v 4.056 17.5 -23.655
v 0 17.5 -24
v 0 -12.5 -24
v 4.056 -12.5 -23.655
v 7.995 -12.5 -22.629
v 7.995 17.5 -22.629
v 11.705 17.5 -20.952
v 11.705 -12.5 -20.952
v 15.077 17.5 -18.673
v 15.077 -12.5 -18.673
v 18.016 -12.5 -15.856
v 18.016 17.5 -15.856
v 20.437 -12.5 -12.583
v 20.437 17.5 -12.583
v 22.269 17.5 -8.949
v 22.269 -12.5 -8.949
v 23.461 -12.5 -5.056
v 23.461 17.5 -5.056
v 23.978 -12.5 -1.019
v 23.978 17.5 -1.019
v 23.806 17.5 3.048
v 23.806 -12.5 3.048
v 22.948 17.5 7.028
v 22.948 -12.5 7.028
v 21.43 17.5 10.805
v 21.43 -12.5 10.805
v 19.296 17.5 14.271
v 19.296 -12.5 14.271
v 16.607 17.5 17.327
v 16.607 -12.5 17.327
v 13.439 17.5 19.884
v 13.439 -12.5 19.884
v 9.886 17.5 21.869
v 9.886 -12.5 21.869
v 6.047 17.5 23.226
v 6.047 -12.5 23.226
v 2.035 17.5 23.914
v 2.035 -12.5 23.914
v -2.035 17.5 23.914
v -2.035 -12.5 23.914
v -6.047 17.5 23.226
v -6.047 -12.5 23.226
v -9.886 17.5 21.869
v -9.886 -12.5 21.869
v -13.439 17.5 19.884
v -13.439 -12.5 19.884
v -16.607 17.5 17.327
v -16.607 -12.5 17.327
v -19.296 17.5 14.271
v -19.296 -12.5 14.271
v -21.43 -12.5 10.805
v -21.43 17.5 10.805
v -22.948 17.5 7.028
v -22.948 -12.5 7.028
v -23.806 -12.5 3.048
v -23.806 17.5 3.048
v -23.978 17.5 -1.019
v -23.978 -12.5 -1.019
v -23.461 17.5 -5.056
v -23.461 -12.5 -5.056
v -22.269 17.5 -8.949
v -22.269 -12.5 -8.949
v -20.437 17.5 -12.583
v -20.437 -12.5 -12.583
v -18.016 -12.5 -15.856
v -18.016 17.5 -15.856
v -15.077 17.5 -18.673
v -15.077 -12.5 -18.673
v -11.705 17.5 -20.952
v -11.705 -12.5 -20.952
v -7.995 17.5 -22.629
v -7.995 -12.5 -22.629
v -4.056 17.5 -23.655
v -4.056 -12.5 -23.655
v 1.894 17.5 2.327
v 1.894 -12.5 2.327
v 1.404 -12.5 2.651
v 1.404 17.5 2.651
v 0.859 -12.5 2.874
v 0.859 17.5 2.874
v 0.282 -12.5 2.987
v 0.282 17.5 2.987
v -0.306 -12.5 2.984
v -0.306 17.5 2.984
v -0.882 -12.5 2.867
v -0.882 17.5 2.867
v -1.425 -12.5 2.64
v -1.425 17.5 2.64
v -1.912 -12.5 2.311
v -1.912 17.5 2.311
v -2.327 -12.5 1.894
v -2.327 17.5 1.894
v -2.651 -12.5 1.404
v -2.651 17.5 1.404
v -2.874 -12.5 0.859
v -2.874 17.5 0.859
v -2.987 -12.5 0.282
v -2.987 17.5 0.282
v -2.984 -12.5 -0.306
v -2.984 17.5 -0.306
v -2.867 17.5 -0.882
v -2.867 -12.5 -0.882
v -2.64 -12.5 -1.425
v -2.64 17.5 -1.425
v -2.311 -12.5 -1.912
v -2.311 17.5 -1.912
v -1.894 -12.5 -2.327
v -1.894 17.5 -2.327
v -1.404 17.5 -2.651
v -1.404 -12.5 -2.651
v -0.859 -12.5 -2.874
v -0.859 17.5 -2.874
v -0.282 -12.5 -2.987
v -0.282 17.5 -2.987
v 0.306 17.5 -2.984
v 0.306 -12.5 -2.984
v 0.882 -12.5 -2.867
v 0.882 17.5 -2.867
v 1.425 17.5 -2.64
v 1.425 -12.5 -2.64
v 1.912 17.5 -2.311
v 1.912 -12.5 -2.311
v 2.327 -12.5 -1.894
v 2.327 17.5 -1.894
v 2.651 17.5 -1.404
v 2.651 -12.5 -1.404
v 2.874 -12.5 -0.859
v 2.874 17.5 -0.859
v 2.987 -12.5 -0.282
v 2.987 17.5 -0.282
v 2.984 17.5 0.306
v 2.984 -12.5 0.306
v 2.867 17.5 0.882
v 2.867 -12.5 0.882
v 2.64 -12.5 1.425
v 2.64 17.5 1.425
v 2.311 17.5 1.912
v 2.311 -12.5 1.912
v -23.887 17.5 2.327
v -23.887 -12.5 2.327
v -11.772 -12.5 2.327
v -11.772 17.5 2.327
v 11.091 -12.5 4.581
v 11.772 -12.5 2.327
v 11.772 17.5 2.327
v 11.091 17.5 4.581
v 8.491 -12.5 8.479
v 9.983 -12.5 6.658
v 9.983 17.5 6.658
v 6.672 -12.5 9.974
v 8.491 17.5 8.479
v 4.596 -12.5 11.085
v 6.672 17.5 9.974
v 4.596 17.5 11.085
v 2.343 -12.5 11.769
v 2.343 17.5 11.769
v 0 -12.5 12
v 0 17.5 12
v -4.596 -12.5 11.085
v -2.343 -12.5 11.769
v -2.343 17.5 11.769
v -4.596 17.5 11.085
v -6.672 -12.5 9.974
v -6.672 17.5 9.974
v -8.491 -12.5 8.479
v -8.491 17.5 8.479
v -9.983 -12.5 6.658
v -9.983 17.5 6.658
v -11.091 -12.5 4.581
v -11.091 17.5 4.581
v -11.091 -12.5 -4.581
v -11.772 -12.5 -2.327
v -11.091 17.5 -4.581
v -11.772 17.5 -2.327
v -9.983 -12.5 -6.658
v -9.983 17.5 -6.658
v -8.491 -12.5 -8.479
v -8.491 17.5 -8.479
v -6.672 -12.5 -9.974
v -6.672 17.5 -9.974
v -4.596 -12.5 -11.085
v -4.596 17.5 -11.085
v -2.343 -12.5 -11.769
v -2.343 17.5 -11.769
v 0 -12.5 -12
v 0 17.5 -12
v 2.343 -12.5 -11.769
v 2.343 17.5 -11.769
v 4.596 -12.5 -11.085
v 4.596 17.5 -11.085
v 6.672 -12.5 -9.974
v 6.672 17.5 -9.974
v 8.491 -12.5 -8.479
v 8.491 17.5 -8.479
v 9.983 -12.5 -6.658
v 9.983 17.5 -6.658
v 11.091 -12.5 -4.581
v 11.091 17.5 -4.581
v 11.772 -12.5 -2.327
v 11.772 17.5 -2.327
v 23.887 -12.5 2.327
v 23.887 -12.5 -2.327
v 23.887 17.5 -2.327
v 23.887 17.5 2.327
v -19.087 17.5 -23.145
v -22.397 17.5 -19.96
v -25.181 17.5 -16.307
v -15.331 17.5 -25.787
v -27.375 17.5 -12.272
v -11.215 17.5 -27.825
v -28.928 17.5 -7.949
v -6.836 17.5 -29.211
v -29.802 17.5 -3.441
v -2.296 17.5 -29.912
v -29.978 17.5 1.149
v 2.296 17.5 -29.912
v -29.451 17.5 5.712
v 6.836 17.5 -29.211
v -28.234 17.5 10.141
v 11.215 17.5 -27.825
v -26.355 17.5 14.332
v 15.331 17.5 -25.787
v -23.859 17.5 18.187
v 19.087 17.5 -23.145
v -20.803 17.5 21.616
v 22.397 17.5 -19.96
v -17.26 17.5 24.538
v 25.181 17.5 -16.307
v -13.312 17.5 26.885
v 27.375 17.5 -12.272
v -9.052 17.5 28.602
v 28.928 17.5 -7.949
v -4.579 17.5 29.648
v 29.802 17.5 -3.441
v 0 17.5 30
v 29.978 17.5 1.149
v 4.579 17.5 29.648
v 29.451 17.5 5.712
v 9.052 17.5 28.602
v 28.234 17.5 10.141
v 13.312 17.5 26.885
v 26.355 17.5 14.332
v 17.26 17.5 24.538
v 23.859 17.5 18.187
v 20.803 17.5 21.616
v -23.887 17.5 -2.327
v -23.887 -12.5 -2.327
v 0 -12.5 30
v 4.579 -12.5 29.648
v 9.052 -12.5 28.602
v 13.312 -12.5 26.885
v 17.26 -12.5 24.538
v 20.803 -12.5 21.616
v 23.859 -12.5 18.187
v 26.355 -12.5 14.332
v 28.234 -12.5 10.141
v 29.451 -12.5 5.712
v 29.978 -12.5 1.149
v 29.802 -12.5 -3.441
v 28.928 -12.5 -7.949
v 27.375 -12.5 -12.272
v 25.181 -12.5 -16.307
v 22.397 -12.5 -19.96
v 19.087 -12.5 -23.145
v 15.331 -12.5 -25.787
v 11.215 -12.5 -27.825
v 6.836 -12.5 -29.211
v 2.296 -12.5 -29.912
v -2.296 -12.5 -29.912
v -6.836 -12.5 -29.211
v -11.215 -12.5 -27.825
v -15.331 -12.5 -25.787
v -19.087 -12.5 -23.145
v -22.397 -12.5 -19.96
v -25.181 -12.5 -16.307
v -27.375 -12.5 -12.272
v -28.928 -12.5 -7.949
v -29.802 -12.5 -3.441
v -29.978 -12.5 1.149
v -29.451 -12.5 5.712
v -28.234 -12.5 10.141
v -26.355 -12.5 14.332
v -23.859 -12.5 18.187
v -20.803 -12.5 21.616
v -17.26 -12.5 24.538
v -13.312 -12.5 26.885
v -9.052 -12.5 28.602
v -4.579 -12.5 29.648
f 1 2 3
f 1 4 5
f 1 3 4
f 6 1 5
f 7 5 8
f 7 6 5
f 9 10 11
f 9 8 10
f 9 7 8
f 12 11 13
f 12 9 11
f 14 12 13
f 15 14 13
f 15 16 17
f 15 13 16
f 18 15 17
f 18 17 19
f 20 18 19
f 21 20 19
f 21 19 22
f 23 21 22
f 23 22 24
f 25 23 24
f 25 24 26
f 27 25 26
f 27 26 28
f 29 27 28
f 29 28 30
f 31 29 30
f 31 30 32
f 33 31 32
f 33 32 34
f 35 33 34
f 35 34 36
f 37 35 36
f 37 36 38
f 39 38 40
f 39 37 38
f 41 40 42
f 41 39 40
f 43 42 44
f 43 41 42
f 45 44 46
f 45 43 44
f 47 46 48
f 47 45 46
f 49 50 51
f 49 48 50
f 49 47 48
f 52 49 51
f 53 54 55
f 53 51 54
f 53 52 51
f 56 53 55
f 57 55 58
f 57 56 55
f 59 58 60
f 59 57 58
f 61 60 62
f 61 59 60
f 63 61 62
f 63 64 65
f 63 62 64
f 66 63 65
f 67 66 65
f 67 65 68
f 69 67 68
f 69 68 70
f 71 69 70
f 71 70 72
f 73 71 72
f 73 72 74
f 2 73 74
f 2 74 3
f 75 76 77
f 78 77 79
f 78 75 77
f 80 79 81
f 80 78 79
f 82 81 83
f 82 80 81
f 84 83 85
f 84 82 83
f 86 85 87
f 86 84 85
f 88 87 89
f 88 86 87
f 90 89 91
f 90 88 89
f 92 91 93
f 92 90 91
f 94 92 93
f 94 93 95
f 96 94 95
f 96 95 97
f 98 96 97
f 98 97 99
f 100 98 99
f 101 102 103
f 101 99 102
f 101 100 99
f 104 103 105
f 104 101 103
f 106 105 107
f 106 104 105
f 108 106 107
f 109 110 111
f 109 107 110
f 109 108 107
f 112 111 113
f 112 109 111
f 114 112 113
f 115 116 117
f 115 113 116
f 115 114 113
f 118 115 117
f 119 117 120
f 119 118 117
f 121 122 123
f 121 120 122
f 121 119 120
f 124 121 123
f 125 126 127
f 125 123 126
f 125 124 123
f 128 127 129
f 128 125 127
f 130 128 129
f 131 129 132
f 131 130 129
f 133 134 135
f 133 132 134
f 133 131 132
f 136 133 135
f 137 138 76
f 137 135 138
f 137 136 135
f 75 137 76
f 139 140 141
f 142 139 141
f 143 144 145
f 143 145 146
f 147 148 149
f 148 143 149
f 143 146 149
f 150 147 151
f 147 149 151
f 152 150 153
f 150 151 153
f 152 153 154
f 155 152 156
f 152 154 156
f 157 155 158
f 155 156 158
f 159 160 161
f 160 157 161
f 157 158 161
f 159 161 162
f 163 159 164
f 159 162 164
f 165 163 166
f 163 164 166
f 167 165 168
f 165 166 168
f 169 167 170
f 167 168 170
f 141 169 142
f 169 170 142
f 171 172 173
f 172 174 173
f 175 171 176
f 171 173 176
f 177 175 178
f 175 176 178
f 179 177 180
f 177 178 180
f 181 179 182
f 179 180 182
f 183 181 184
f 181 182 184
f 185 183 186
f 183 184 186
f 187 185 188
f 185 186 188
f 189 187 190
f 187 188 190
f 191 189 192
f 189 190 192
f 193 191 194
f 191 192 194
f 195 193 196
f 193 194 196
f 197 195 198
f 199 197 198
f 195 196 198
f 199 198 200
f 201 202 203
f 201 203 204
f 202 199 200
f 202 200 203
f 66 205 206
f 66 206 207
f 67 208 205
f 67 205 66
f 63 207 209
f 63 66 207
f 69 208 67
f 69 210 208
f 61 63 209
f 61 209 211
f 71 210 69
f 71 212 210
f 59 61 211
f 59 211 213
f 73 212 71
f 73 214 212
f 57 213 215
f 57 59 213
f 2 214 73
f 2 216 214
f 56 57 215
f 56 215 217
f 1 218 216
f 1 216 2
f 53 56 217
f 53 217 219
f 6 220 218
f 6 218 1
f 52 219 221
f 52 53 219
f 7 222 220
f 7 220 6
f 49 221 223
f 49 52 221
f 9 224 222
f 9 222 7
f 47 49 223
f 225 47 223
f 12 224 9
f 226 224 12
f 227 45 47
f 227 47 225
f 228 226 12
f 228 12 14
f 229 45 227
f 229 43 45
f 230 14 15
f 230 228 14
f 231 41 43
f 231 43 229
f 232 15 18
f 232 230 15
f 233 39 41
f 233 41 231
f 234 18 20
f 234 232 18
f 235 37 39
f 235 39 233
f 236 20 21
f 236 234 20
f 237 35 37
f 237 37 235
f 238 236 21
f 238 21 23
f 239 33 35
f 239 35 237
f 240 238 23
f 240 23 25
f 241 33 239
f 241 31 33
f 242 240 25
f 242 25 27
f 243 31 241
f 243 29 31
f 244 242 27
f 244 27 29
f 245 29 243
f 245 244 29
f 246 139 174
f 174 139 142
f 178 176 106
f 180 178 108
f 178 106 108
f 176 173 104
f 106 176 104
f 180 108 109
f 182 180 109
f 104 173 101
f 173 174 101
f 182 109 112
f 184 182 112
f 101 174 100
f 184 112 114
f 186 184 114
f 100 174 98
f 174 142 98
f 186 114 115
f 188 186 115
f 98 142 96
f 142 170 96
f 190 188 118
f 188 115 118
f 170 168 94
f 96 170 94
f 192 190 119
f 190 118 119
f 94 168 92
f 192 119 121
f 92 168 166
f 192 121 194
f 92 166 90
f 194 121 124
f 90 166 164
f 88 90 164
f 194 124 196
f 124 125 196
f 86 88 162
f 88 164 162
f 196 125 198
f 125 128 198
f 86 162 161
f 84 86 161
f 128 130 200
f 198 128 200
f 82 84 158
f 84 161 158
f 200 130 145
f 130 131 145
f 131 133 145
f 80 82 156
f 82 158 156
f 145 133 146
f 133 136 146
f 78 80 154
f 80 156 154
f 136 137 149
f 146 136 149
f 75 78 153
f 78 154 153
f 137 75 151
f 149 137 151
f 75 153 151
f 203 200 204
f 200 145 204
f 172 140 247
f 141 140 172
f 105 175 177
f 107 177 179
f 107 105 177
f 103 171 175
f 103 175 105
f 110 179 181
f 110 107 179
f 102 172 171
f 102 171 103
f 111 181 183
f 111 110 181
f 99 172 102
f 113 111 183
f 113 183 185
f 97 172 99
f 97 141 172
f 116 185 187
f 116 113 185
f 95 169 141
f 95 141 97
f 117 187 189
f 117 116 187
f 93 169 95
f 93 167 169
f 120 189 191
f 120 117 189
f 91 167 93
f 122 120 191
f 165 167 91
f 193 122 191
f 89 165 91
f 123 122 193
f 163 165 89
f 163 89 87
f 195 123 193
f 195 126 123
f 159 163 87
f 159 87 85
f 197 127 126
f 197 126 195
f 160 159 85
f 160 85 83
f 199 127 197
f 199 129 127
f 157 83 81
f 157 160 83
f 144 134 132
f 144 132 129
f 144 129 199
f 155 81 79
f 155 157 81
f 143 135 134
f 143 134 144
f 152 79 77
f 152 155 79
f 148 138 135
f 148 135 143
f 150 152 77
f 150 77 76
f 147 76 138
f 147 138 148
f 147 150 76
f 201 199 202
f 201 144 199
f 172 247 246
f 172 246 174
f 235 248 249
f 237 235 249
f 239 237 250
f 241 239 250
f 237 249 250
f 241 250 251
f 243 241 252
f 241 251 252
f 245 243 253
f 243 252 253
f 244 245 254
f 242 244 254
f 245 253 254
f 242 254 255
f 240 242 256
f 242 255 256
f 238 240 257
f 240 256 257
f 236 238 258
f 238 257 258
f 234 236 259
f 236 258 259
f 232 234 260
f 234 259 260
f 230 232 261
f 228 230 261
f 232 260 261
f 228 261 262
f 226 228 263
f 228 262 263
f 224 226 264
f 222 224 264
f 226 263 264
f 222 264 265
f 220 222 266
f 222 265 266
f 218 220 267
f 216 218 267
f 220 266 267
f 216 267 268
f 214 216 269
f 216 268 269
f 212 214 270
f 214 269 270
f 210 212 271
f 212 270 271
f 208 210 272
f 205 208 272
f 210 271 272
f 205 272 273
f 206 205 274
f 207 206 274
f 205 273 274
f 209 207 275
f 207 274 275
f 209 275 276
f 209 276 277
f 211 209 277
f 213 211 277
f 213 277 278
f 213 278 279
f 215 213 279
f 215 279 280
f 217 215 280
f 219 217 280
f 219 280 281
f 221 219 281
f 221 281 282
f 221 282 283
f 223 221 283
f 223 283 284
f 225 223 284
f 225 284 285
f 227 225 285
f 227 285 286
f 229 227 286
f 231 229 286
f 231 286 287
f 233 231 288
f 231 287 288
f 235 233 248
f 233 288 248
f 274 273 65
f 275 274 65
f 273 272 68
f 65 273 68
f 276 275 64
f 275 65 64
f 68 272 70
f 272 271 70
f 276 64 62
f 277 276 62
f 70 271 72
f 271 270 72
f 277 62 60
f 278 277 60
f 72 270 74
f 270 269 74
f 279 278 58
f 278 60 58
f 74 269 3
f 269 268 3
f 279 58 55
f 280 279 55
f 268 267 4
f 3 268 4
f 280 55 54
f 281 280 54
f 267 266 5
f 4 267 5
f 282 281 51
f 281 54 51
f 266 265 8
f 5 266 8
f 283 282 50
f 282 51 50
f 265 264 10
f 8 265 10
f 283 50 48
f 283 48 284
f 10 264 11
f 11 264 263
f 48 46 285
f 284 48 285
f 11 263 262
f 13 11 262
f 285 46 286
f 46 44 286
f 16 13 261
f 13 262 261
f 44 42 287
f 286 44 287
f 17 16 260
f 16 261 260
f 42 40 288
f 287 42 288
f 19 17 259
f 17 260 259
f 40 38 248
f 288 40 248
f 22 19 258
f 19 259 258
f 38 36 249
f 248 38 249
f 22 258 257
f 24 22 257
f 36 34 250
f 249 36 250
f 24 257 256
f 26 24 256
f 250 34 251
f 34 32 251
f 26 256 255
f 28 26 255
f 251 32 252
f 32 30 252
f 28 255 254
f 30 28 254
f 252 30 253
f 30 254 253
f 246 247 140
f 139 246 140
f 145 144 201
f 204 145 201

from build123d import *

# Parameters (mm, degrees)
SKETCH2_R               = 5
SKETCH2_R_2             = 0.5
BOSS_EXTRUDE1_DEPTH     = 5
CUT_EXTRUDE1_DEPTH      = 9.660254038
CUT_EXTRUDE1_DEPTH_BACK = 9.660254038
SKETCH4_R               = 4
SKETCH4_R_2             = 2
SKETCH5_W               = 7.962318844
SKETCH5_H               = 0.775550536
BOSS_EXTRUDE2_DEPTH     = 5
CUT_EXTRUDE2_DEPTH      = 9.660254038
CUT_EXTRUDE2_DEPTH_BACK = 9.660254038
SKETCH6_R               = 0.5
SCALE1_SCALE            = 6


with BuildPart() as part:
    # Sketch2 → Boss-Extrude1 (new body)
    with BuildSketch(Plane(origin=(0, 0, 0), x_dir=(1, 0, 0), z_dir=(0, 1, 0))):
        with Locations(Location((0, 0, 0), (0, 0, 270))):
            Circle(SKETCH2_R)
        with Locations(Location((0, 0, 0), (0, 0, 270))):
            Circle(SKETCH2_R_2, mode=Mode.SUBTRACT)
    extrude(amount=BOSS_EXTRUDE1_DEPTH)

    # Sketch4 → Cut-Extrude1 (cut, two sides: drawn at the far end of the back side and taken through both)
    with BuildSketch(Plane.XZ.offset(-CUT_EXTRUDE1_DEPTH_BACK)):
        with Locations(Location((0, 0, 0), (0, 0, 270))):
            Circle(SKETCH4_R)
        with Locations(Location((0, 0, 0), (0, 0, 270))):
            Circle(SKETCH4_R_2, mode=Mode.SUBTRACT)
    extrude(amount=CUT_EXTRUDE1_DEPTH + CUT_EXTRUDE1_DEPTH_BACK, mode=Mode.SUBTRACT)


with BuildPart() as cut_extrude1_piece_1:
    # of the separate pieces the step leaves, piece 1, a body of its own (cut_extrude1_pieces)
    add(part.part.solids().sort_by_distance((0, 0, 5))[0])


with BuildPart() as cut_extrude1_piece_2:
    # of the separate pieces the step leaves, piece 2, a body of its own (cut_extrude1_pieces)
    add(part.part.solids().sort_by_distance((0, 0, -2))[0])

    # Sketch5 → Boss-Extrude2 (add)
    with BuildSketch(Plane.XZ):
        Rectangle(SKETCH5_W, SKETCH5_H)
    extrude(amount=-BOSS_EXTRUDE2_DEPTH)

    # Sketch6 → Cut-Extrude2 (cut, two sides: drawn at the far end of the back side and taken through both)
    with BuildSketch(Plane.XZ.offset(-CUT_EXTRUDE2_DEPTH_BACK)):
        with Locations(Location((0, 0, 0), (0, 0, 90))):
            Circle(SKETCH6_R)
    extrude(amount=CUT_EXTRUDE2_DEPTH + CUT_EXTRUDE2_DEPTH_BACK, mode=Mode.SUBTRACT)


with BuildPart() as cut_extrude1_piece_2_1:
    # Scale1: scaled about (0, 2.5, 0)
    add(cut_extrude1_piece_2.part.scale(SCALE1_SCALE).moved(Location((0, -12.5, 0))))


with BuildPart() as cut_extrude1_piece_1_1:
    # Scale1: scaled about (0, 2.5, 0)
    add(cut_extrude1_piece_1.part.scale(SCALE1_SCALE).moved(Location((0, -12.5, 0))))


solid = Compound([cut_extrude1_piece_2_1.part, cut_extrude1_piece_1_1.part])
